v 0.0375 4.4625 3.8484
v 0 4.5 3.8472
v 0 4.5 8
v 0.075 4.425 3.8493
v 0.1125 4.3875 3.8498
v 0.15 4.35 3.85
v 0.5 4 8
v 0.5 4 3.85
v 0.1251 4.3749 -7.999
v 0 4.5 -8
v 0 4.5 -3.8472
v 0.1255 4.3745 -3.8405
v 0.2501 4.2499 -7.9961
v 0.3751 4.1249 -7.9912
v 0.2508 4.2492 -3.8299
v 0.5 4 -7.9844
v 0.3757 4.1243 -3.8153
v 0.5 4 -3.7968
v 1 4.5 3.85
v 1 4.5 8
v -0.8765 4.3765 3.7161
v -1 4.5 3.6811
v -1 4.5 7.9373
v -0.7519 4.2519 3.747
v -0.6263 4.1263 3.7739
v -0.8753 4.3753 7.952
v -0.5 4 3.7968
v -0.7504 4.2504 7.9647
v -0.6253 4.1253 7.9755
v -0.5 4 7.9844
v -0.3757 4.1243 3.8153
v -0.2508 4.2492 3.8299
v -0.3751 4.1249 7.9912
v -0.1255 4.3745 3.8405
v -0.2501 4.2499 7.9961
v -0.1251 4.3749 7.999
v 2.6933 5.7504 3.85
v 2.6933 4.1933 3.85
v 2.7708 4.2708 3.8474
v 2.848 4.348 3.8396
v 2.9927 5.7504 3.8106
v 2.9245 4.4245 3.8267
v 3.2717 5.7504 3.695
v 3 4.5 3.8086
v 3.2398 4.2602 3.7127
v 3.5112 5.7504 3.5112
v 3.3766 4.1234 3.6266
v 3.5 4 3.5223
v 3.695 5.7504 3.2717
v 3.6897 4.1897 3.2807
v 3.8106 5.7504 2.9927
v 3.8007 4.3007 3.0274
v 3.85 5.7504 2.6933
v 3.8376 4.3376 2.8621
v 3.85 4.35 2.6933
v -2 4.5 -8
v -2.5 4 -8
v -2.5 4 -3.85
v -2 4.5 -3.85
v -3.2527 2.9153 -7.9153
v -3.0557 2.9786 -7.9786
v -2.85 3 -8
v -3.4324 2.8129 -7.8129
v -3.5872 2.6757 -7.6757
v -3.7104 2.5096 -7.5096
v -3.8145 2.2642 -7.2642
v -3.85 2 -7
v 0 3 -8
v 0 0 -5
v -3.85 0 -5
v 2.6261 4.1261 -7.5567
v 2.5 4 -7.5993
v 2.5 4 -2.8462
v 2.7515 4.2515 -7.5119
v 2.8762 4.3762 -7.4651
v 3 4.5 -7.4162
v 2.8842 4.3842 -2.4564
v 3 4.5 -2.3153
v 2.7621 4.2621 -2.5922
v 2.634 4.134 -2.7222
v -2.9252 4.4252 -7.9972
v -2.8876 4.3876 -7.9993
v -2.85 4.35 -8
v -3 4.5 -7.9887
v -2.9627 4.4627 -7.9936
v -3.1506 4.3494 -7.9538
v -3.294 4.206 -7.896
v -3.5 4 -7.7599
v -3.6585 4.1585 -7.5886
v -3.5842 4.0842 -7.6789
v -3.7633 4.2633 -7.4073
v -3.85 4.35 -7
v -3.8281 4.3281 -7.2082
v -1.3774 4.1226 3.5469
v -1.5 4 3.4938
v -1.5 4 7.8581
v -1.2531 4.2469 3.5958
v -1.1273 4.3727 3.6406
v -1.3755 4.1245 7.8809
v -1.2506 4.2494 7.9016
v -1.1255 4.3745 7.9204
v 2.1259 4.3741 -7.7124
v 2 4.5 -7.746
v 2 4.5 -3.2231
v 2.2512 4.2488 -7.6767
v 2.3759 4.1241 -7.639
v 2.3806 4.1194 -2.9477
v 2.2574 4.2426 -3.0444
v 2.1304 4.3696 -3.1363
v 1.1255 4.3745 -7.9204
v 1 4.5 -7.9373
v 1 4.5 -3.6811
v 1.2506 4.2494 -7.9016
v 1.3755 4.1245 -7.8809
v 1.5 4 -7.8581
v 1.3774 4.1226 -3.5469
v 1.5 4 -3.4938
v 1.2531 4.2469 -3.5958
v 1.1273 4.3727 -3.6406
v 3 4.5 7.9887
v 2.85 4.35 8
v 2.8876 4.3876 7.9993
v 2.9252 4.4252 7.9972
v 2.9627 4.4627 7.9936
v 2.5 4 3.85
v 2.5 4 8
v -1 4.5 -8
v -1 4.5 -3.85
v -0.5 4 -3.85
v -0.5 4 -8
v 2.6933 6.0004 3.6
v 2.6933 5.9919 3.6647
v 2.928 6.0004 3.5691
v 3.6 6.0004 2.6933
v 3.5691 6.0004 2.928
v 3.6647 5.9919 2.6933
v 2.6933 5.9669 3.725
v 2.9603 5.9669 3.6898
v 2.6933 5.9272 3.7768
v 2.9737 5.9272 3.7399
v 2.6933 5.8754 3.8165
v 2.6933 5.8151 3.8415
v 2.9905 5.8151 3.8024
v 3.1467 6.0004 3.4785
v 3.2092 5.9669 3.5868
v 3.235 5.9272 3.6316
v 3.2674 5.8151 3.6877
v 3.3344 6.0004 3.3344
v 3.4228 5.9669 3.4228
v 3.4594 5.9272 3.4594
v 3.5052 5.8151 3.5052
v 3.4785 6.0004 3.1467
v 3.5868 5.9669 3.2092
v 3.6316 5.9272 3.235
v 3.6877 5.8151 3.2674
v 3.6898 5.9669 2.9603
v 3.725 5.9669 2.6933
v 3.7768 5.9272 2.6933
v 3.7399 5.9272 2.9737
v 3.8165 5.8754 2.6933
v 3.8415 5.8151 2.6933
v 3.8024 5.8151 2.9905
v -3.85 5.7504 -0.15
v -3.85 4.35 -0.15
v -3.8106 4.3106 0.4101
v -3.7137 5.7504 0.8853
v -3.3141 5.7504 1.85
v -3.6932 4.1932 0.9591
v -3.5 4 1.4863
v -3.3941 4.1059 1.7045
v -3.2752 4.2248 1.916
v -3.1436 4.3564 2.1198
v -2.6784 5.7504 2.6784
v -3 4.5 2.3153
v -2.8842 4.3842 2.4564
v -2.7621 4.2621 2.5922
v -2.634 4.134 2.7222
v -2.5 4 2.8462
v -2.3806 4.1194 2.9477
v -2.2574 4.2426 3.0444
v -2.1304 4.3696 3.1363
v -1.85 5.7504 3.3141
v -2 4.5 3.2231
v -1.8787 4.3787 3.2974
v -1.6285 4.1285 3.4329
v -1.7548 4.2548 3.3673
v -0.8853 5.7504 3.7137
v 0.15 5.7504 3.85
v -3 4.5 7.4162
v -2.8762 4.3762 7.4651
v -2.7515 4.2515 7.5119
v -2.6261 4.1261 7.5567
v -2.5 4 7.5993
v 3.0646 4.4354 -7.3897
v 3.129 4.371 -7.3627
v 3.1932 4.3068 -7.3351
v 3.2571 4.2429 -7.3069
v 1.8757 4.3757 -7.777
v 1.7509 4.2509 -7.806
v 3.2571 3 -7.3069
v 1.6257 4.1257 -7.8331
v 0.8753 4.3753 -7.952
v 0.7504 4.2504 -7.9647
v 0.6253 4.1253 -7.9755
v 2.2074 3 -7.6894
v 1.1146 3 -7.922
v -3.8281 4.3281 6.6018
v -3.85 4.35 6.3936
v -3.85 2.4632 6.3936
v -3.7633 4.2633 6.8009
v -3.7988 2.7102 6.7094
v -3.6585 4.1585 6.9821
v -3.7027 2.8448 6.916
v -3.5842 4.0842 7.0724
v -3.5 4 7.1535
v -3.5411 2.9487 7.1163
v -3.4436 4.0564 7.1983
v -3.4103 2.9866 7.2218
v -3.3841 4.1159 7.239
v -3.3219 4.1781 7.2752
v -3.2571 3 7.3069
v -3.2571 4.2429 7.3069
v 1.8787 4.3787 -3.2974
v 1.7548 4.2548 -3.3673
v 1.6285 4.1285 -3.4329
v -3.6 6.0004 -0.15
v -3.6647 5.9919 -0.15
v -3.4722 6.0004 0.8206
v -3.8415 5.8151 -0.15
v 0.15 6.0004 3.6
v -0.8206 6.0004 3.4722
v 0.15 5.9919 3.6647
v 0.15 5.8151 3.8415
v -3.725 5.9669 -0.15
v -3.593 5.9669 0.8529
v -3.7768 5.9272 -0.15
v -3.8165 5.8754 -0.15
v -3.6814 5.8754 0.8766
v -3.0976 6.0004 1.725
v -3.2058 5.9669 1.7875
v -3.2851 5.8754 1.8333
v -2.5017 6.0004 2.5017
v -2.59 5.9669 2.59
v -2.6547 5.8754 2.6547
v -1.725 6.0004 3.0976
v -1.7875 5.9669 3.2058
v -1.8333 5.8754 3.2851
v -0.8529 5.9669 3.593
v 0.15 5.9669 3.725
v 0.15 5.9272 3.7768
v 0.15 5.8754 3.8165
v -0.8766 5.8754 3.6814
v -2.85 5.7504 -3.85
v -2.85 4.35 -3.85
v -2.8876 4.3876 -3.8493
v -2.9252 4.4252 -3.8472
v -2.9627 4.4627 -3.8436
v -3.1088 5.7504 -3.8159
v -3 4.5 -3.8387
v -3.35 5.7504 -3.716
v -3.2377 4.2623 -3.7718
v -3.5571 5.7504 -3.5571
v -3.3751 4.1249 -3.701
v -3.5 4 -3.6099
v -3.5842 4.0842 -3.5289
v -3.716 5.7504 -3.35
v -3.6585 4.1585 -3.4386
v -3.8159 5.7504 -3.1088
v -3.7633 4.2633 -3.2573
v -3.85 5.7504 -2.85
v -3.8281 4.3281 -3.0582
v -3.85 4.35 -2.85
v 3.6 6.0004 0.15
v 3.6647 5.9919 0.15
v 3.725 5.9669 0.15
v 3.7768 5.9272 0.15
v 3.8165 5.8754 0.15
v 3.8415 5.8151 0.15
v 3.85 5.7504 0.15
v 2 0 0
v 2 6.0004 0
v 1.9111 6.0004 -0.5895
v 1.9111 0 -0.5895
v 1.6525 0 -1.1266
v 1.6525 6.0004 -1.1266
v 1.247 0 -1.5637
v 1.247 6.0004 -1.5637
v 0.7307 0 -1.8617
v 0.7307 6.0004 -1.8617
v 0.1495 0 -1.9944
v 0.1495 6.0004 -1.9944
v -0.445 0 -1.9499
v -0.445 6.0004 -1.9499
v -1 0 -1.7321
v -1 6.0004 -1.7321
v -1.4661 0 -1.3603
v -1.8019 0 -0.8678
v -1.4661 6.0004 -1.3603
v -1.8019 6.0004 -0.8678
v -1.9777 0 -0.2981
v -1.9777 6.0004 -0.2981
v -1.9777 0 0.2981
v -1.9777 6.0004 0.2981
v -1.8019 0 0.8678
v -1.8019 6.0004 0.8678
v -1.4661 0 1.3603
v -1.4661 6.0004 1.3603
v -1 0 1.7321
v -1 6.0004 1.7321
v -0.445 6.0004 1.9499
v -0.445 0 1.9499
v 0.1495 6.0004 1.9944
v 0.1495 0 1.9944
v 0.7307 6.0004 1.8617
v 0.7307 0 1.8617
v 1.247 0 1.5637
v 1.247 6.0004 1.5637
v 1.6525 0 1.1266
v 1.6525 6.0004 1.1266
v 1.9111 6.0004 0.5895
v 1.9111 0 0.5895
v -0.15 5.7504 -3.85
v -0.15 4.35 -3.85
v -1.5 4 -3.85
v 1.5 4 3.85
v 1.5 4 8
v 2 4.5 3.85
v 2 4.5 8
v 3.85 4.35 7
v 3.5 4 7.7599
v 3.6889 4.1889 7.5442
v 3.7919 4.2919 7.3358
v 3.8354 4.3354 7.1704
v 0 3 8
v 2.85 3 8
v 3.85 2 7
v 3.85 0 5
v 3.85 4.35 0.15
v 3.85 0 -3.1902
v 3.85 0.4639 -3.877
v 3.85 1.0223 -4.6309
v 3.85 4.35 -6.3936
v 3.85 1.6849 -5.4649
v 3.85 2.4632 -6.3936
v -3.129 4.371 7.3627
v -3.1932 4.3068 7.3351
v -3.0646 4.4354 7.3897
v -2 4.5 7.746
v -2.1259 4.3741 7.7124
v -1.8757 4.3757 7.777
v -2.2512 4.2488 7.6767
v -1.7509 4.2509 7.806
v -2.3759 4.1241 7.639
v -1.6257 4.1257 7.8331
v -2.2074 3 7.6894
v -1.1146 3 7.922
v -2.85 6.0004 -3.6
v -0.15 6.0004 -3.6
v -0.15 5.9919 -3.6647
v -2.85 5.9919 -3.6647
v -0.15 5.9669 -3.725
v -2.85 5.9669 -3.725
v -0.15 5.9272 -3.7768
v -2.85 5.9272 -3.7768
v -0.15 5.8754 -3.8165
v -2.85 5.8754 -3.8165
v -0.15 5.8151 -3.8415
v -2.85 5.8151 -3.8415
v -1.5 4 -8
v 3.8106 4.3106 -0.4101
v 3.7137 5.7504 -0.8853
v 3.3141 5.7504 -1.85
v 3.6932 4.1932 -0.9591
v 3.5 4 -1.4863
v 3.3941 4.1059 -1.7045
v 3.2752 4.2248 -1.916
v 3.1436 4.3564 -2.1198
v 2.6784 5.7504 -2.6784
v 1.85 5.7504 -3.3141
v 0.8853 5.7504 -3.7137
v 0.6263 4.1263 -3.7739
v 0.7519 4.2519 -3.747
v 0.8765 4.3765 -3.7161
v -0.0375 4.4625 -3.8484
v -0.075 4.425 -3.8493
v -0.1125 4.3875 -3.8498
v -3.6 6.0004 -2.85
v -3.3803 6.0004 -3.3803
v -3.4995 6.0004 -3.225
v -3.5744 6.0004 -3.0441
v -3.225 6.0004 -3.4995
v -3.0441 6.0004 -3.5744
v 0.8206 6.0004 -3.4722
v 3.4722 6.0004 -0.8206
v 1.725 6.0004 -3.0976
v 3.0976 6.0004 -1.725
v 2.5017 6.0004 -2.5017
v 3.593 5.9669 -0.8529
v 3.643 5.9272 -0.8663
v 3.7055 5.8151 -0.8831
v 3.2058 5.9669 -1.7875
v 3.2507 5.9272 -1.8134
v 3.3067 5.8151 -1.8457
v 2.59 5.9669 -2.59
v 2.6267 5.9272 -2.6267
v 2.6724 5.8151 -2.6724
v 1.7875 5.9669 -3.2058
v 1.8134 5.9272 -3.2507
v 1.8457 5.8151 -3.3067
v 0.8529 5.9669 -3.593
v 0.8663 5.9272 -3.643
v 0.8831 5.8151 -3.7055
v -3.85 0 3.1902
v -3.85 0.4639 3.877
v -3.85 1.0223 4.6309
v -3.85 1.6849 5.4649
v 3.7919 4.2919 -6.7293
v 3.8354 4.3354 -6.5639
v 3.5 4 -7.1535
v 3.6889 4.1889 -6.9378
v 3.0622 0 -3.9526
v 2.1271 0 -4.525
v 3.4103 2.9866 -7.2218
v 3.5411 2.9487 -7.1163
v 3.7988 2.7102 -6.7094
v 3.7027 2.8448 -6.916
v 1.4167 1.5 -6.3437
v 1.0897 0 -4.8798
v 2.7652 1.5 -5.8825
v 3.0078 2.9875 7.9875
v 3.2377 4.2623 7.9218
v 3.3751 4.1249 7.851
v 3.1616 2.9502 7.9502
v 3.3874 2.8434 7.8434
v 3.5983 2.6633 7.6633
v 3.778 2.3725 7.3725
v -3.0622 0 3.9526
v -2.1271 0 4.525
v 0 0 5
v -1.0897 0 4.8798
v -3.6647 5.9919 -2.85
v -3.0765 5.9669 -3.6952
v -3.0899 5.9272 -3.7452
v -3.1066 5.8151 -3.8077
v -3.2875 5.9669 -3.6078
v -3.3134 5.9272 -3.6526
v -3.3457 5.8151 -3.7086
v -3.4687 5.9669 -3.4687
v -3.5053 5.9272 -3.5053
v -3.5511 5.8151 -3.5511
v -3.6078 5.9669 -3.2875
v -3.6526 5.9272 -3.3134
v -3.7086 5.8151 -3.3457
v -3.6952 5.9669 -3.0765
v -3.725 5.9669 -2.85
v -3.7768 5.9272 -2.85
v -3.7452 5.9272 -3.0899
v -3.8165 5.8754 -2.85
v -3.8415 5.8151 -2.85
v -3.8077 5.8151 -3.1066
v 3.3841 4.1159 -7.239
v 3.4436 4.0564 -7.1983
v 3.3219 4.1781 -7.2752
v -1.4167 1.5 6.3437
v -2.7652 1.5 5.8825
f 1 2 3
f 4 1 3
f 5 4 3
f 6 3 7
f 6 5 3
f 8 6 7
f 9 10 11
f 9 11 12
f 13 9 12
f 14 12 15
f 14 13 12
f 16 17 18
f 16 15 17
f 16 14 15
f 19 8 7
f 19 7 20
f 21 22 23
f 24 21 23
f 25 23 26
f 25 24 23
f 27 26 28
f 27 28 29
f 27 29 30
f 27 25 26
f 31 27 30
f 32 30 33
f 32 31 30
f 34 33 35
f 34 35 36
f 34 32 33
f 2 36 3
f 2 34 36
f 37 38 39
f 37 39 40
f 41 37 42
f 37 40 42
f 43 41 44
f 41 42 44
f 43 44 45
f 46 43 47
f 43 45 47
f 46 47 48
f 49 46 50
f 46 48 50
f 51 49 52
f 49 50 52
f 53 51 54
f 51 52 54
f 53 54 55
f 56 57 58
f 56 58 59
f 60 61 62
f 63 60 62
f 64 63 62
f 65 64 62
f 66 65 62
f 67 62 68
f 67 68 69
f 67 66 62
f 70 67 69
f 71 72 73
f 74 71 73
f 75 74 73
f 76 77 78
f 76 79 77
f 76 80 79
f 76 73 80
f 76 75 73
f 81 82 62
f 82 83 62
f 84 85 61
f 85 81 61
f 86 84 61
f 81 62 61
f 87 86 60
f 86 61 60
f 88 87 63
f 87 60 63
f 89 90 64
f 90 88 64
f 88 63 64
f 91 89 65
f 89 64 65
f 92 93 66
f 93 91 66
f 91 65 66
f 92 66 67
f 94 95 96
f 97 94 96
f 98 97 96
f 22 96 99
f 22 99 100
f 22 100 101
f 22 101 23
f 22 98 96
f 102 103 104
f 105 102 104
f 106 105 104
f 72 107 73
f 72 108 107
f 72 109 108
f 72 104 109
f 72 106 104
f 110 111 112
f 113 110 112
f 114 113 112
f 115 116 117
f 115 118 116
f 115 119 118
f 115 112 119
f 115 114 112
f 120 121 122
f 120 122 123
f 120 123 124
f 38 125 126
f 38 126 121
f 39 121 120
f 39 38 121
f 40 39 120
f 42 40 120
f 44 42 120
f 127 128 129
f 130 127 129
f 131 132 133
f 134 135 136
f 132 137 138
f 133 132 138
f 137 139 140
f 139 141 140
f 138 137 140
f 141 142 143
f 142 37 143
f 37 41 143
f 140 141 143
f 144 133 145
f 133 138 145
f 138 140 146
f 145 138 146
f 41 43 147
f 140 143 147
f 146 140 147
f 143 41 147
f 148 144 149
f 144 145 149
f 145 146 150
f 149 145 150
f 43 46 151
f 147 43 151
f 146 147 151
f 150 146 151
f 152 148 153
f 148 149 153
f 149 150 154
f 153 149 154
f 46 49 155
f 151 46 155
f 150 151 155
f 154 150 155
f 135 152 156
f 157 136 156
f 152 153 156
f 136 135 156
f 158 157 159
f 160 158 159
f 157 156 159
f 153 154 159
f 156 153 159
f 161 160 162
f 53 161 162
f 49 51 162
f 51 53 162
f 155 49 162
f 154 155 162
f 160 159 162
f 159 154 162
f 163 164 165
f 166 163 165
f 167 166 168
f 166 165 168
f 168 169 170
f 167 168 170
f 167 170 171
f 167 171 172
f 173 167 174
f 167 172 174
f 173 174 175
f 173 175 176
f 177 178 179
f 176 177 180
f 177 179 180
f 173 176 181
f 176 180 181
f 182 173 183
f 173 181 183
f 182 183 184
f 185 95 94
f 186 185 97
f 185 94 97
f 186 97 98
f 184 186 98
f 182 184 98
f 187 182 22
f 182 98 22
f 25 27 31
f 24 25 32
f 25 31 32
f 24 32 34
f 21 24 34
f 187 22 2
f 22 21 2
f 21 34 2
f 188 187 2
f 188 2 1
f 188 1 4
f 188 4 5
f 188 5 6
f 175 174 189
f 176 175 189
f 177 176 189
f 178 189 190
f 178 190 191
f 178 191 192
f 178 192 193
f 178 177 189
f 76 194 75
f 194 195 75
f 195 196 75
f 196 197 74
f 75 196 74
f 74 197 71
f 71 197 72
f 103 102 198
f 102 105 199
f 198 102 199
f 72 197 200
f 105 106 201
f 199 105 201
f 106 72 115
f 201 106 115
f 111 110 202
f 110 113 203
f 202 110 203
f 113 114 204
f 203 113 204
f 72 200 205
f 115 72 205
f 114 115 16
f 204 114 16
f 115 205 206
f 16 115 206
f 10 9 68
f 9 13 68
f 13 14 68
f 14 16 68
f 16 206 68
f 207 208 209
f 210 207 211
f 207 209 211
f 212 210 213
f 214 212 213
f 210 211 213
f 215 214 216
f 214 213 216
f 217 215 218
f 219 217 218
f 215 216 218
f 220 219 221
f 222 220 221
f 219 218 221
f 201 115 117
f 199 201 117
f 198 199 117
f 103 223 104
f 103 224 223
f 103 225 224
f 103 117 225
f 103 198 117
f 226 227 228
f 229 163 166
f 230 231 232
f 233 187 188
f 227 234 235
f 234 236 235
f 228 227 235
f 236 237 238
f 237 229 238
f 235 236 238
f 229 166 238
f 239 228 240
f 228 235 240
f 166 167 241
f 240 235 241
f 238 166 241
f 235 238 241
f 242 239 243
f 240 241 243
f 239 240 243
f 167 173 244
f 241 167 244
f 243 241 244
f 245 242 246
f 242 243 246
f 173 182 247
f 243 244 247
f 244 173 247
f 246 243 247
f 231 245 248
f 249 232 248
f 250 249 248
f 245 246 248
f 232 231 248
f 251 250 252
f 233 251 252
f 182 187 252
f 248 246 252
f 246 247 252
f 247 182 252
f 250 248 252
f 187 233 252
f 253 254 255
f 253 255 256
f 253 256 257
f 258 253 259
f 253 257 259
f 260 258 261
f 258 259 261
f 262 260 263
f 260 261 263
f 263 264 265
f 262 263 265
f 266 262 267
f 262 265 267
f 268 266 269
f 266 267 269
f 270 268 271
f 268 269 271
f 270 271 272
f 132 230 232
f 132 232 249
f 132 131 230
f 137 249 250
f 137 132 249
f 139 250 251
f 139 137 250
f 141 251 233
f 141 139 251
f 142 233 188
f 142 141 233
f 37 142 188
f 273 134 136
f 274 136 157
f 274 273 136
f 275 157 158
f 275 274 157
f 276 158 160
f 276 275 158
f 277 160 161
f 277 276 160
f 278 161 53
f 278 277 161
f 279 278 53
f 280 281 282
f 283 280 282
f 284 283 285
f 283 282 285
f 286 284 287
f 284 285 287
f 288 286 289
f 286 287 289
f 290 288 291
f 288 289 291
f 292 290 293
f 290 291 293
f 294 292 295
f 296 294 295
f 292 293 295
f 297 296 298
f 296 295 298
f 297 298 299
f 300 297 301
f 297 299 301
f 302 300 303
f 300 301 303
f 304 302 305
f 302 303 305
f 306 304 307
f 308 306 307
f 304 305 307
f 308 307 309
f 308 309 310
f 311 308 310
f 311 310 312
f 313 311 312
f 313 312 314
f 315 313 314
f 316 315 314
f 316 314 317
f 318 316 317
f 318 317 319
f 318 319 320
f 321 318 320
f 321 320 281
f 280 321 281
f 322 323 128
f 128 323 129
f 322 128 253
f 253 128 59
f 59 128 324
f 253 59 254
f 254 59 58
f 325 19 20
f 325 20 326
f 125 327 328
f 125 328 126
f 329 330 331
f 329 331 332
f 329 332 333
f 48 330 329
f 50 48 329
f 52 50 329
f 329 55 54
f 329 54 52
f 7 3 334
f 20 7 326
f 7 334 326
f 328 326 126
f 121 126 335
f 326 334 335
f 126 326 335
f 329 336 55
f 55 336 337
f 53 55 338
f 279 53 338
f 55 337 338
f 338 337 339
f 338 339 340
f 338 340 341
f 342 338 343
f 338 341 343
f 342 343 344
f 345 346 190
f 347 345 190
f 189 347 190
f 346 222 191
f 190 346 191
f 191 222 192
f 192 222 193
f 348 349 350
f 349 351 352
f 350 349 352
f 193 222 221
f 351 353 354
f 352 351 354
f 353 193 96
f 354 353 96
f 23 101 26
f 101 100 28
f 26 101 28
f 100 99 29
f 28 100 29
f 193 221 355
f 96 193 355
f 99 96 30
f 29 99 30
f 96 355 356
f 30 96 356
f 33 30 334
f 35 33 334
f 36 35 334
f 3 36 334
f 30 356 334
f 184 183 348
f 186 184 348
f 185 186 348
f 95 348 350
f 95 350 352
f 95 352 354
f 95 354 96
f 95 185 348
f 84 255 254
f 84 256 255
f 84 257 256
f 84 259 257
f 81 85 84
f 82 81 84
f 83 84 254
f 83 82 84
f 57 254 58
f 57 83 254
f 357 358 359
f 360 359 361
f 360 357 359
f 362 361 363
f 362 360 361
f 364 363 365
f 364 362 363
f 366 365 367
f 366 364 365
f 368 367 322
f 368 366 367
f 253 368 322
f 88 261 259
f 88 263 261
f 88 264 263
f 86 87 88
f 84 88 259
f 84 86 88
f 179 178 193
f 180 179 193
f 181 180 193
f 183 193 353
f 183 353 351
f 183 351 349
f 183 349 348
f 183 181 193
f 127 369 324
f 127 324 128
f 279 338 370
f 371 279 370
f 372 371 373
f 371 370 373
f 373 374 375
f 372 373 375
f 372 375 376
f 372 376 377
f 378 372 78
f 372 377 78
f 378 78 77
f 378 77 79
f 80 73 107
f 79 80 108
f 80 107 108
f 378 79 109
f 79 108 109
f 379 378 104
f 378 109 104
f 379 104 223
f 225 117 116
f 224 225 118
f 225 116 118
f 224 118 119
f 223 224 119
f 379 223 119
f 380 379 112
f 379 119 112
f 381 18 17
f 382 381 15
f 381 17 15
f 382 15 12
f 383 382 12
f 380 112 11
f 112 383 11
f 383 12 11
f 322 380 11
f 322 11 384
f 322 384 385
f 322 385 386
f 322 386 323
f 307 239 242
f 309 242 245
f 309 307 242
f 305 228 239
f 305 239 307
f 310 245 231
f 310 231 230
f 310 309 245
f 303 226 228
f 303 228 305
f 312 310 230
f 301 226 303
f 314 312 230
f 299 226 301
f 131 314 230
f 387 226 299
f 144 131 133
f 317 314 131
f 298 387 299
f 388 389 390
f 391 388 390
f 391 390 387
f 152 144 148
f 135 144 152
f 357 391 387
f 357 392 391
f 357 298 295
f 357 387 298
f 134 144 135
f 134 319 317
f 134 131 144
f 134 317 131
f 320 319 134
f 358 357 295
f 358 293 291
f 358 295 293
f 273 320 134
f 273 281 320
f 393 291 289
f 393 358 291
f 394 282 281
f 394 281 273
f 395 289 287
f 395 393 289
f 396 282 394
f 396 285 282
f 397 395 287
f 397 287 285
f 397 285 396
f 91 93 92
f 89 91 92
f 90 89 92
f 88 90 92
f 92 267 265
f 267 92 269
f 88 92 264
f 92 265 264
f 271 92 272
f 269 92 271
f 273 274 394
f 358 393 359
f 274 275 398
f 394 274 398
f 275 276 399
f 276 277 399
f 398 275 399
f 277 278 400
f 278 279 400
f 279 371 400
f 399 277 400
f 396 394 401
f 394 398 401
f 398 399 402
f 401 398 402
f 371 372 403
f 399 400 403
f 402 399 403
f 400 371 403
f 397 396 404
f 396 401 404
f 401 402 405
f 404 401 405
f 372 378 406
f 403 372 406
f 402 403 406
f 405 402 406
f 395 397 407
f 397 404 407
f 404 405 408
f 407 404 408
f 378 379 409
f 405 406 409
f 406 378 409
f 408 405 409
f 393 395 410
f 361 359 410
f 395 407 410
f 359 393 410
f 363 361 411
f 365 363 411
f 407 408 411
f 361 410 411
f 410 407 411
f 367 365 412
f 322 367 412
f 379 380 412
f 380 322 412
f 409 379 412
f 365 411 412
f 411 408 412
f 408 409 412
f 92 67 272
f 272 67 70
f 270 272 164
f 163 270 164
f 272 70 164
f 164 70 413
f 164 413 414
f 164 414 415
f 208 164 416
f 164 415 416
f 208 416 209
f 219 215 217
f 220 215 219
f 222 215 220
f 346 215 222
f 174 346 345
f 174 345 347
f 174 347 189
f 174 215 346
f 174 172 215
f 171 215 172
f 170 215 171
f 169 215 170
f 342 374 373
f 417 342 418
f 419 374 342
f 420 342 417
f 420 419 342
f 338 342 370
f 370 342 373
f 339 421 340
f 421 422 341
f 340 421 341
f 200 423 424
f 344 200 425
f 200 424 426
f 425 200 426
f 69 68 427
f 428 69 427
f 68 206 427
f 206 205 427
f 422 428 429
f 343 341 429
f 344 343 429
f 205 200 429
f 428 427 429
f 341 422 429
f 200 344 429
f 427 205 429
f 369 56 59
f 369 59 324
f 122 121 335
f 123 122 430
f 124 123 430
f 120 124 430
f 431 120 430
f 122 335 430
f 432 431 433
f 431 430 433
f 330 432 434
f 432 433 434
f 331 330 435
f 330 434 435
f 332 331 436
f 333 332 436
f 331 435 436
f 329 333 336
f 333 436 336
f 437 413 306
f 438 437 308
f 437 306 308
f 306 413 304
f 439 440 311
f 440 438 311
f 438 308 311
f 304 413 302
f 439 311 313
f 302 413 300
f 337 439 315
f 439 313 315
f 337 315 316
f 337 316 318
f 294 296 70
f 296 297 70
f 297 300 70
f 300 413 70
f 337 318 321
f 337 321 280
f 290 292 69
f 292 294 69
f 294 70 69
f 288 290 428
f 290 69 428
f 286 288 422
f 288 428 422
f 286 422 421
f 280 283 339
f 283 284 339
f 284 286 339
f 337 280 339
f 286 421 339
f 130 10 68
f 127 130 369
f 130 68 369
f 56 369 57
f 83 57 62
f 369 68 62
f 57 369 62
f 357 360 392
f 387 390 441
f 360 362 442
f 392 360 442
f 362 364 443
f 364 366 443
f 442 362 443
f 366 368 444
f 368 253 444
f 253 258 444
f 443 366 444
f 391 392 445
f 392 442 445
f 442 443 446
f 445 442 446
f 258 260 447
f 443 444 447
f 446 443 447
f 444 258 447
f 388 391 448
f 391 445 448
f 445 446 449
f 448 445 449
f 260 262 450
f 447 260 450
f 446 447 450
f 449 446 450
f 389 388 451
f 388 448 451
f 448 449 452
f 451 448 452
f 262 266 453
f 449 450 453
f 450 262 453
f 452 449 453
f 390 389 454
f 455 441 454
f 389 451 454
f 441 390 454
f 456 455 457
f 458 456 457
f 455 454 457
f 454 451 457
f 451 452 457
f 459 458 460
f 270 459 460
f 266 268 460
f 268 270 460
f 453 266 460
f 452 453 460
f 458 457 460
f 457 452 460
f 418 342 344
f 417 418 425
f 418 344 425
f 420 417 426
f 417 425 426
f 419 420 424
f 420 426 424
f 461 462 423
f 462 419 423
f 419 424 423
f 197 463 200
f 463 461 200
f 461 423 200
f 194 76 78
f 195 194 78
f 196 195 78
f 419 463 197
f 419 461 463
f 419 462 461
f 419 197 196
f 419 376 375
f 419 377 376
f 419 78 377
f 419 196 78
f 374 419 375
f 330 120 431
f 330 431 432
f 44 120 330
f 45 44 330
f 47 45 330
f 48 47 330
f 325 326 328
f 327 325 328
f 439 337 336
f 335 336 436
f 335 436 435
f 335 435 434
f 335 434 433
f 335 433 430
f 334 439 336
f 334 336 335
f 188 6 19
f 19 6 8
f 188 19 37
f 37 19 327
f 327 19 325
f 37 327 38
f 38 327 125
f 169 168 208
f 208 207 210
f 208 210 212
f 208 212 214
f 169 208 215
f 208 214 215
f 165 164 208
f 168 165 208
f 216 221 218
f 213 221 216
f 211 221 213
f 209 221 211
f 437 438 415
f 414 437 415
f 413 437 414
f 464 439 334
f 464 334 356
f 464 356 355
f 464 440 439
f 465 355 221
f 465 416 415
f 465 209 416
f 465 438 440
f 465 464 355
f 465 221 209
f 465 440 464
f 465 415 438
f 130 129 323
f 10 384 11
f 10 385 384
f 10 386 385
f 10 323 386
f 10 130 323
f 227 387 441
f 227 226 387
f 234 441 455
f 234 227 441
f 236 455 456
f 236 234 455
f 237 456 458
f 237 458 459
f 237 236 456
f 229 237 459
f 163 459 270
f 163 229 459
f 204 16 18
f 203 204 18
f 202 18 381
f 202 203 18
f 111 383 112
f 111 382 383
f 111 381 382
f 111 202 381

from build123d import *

# Parameters (mm, degrees)
EXTRUDE1_DEPTH          = 4.5
CUT_EXTRUDE1_DEPTH      = 8
CUT_EXTRUDE1_DEPTH_BACK = 8
EXTRUDE2_DEPTH          = 6.00039994
CUT_EXTRUDE2_DEPTH      = 4
CUT_EXTRUDE2_DEPTH_BACK = 4
CUT_REVOLVE1_ANGLE      = 60
CUT_REVOLVE2_ANGLE      = 60
SKETCH9_R               = 2.48793
CUT_EXTRUDE3_DEPTH      = 7.00040004
FILLET4_R               = 0.25
SKETCH10_R              = 2.48793
EXTRUDE3_DEPTH          = 6.0004
SKETCH12_R              = 2
CUT_EXTRUDE4_DEPTH      = 7.00040004


with BuildPart() as part:
    # Sketch1 → Extrude1 (new body)
    with BuildSketch(Plane(origin=(0, 0, 0), x_dir=(1, 0, 0), z_dir=(0, 1, 0))):
        with BuildLine():
            Line((0, -8), (2.85, -8))
            ThreePointArc((2.85, -8), (3.557106781, -7.707106781), (3.85, -7))
            Line((3.85, -7), (3.85, 6.393551439))
            ThreePointArc((3.85, 6.393551439), (3.688791661, 6.938003962), (3.2571429, 7.306915911))
            ThreePointArc((3.2571429, 7.306915911), (1.66503344, 7.824810774), (0, 8))
            Line((0, 8), (-2.85, 8))
            ThreePointArc((-2.85, 8), (-3.557106781, 7.707106781), (-3.85, 7))
            Line((-3.85, 7), (-3.85, -6.393551439))
            ThreePointArc((-3.85, -6.393551439), (-3.688791661, -6.938003962), (-3.2571429, -7.306915911))
            ThreePointArc((-3.2571429, -7.306915911), (-1.66503344, -7.824810774), (0, -8))
        make_face()
    extrude(amount=EXTRUDE1_DEPTH)

    # Sketch2 → Cut-Extrude1 (cut, two sides)
    with BuildSketch(Plane.XY) as cut_extrude1_sk:
        Polygon((-4, 4.5), (-3.5, 4), (-3, 4.5), (-2.5, 4), (-2, 4.5), (-1.5, 4), (-1, 4.5), (-0.5, 4), (0, 4.5), (0.5, 4), (1, 4.5), (1.5, 4), (2, 4.5), (2.5, 4), (3, 4.5), (3.5, 4), (4, 4.5), (4, 5.5), (-4, 5.5), align=None)
    extrude(amount=CUT_EXTRUDE1_DEPTH, mode=Mode.SUBTRACT)
    extrude(cut_extrude1_sk.sketch, amount=-CUT_EXTRUDE1_DEPTH_BACK, mode=Mode.SUBTRACT)

    # Sketch3 → Extrude2 (add)
    with BuildSketch(Plane(origin=(0, 0, 0), x_dir=(1, 0, 0), z_dir=(0, 1, 0))):
        with BuildLine():
            Line((0.15, -3.85), (2.693303618, -3.85))
            ThreePointArc((2.693303618, -3.85), (3.511211473, -3.511211473), (3.85, -2.693303618))
            Line((3.85, -2.693303618), (3.85, -0.15))
            ThreePointArc((3.85, -0.15), (2.678427125, 2.678427125), (-0.15, 3.85))
            Line((-0.15, 3.85), (-2.85, 3.85))
            ThreePointArc((-2.85, 3.85), (-3.557106781, 3.557106781), (-3.85, 2.85))
            Line((-3.85, 2.85), (-3.85, 0.15))
            ThreePointArc((-3.85, 0.15), (-2.678427125, -2.678427125), (0.15, -3.85))
        make_face()
    extrude(amount=EXTRUDE2_DEPTH)

    # Sketch4 → Cut-Extrude2 (cut, two sides)
    with BuildSketch(Plane(origin=(0, 0, 0), x_dir=(0, 0, -1), z_dir=(1, 0, 0))) as cut_extrude2_sk:
        Polygon((-9, -1), (9, -1), (9, 4), (5, 0), (-5, 0), (-9, 4), align=None)
    extrude(amount=CUT_EXTRUDE2_DEPTH, mode=Mode.SUBTRACT)
    extrude(cut_extrude2_sk.sketch, amount=-CUT_EXTRUDE2_DEPTH_BACK, mode=Mode.SUBTRACT)

    # Sketch5 → Cut-Revolve1 (revolve, cut)
    with BuildSketch(Plane(origin=(0, 0, 0), x_dir=(0, 0, -1), z_dir=(1, 0, 0))):
        Polygon((0, -1), (-9, -1), (-9, 3), (-8, 3), (-5, 0), (0, 0), align=None)
    revolve(axis=Axis((0, 3, 0), (0, -1, 0)), revolution_arc=CUT_REVOLVE1_ANGLE, mode=Mode.SUBTRACT)

    # Sketch6 → Cut-Revolve2 (revolve, cut)
    with BuildSketch(Plane(origin=(0, 0, 0), x_dir=(0, 0, -1), z_dir=(1, 0, 0))):
        Polygon((0, 0), (5, 0), (8, 3), (9, 3), (9, -1), (0, -1), align=None)
    revolve(axis=Axis((0, -1, 0), (0, -1, 0)), revolution_arc=CUT_REVOLVE2_ANGLE, mode=Mode.SUBTRACT)

    # Sketch9 → Cut-Extrude3 (cut, through all)
    with BuildSketch(Plane(origin=(0, 6.00039994, 0), x_dir=(1, 0, 0), z_dir=(0, 1, 0))):
        Circle(SKETCH9_R)
    extrude(amount=-CUT_EXTRUDE3_DEPTH, mode=Mode.SUBTRACT)

    # Fillet4
    fillet4_edges = [part.edges().sort_by_distance(p)[0] for p in [
        (-2.678427125, 6.00039994, 2.678427125),
        (1.421651809, 6.00039994, 3.85),
        (3.511211473, 6.00039994, 3.511211473),
        (3.85, 6.00039994, 1.421651809),
        (2.678427125, 6.00039994, -2.678427125),
        (-1.5, 6.00039994, -3.85),
        (-3.557106781, 6.00039994, -3.557106781),
        (-3.85, 6.00039994, -1.5),
    ]]
    fillet(fillet4_edges, radius=FILLET4_R)

    # Sketch10 → Extrude3 (add)
    with BuildSketch(Plane(origin=(0, 6.00039994, 0), x_dir=(1, 0, 0), z_dir=(0, 1, 0))):
        Circle(SKETCH10_R)
    extrude(amount=-EXTRUDE3_DEPTH)

    # Sketch12 → Cut-Extrude4 (cut, through all)
    with BuildSketch(Plane(origin=(0, 6.00039994, 0), x_dir=(1, 0, 0), z_dir=(0, 1, 0))):
        Circle(SKETCH12_R)
    extrude(amount=-CUT_EXTRUDE4_DEPTH, mode=Mode.SUBTRACT)


solid = part.part
